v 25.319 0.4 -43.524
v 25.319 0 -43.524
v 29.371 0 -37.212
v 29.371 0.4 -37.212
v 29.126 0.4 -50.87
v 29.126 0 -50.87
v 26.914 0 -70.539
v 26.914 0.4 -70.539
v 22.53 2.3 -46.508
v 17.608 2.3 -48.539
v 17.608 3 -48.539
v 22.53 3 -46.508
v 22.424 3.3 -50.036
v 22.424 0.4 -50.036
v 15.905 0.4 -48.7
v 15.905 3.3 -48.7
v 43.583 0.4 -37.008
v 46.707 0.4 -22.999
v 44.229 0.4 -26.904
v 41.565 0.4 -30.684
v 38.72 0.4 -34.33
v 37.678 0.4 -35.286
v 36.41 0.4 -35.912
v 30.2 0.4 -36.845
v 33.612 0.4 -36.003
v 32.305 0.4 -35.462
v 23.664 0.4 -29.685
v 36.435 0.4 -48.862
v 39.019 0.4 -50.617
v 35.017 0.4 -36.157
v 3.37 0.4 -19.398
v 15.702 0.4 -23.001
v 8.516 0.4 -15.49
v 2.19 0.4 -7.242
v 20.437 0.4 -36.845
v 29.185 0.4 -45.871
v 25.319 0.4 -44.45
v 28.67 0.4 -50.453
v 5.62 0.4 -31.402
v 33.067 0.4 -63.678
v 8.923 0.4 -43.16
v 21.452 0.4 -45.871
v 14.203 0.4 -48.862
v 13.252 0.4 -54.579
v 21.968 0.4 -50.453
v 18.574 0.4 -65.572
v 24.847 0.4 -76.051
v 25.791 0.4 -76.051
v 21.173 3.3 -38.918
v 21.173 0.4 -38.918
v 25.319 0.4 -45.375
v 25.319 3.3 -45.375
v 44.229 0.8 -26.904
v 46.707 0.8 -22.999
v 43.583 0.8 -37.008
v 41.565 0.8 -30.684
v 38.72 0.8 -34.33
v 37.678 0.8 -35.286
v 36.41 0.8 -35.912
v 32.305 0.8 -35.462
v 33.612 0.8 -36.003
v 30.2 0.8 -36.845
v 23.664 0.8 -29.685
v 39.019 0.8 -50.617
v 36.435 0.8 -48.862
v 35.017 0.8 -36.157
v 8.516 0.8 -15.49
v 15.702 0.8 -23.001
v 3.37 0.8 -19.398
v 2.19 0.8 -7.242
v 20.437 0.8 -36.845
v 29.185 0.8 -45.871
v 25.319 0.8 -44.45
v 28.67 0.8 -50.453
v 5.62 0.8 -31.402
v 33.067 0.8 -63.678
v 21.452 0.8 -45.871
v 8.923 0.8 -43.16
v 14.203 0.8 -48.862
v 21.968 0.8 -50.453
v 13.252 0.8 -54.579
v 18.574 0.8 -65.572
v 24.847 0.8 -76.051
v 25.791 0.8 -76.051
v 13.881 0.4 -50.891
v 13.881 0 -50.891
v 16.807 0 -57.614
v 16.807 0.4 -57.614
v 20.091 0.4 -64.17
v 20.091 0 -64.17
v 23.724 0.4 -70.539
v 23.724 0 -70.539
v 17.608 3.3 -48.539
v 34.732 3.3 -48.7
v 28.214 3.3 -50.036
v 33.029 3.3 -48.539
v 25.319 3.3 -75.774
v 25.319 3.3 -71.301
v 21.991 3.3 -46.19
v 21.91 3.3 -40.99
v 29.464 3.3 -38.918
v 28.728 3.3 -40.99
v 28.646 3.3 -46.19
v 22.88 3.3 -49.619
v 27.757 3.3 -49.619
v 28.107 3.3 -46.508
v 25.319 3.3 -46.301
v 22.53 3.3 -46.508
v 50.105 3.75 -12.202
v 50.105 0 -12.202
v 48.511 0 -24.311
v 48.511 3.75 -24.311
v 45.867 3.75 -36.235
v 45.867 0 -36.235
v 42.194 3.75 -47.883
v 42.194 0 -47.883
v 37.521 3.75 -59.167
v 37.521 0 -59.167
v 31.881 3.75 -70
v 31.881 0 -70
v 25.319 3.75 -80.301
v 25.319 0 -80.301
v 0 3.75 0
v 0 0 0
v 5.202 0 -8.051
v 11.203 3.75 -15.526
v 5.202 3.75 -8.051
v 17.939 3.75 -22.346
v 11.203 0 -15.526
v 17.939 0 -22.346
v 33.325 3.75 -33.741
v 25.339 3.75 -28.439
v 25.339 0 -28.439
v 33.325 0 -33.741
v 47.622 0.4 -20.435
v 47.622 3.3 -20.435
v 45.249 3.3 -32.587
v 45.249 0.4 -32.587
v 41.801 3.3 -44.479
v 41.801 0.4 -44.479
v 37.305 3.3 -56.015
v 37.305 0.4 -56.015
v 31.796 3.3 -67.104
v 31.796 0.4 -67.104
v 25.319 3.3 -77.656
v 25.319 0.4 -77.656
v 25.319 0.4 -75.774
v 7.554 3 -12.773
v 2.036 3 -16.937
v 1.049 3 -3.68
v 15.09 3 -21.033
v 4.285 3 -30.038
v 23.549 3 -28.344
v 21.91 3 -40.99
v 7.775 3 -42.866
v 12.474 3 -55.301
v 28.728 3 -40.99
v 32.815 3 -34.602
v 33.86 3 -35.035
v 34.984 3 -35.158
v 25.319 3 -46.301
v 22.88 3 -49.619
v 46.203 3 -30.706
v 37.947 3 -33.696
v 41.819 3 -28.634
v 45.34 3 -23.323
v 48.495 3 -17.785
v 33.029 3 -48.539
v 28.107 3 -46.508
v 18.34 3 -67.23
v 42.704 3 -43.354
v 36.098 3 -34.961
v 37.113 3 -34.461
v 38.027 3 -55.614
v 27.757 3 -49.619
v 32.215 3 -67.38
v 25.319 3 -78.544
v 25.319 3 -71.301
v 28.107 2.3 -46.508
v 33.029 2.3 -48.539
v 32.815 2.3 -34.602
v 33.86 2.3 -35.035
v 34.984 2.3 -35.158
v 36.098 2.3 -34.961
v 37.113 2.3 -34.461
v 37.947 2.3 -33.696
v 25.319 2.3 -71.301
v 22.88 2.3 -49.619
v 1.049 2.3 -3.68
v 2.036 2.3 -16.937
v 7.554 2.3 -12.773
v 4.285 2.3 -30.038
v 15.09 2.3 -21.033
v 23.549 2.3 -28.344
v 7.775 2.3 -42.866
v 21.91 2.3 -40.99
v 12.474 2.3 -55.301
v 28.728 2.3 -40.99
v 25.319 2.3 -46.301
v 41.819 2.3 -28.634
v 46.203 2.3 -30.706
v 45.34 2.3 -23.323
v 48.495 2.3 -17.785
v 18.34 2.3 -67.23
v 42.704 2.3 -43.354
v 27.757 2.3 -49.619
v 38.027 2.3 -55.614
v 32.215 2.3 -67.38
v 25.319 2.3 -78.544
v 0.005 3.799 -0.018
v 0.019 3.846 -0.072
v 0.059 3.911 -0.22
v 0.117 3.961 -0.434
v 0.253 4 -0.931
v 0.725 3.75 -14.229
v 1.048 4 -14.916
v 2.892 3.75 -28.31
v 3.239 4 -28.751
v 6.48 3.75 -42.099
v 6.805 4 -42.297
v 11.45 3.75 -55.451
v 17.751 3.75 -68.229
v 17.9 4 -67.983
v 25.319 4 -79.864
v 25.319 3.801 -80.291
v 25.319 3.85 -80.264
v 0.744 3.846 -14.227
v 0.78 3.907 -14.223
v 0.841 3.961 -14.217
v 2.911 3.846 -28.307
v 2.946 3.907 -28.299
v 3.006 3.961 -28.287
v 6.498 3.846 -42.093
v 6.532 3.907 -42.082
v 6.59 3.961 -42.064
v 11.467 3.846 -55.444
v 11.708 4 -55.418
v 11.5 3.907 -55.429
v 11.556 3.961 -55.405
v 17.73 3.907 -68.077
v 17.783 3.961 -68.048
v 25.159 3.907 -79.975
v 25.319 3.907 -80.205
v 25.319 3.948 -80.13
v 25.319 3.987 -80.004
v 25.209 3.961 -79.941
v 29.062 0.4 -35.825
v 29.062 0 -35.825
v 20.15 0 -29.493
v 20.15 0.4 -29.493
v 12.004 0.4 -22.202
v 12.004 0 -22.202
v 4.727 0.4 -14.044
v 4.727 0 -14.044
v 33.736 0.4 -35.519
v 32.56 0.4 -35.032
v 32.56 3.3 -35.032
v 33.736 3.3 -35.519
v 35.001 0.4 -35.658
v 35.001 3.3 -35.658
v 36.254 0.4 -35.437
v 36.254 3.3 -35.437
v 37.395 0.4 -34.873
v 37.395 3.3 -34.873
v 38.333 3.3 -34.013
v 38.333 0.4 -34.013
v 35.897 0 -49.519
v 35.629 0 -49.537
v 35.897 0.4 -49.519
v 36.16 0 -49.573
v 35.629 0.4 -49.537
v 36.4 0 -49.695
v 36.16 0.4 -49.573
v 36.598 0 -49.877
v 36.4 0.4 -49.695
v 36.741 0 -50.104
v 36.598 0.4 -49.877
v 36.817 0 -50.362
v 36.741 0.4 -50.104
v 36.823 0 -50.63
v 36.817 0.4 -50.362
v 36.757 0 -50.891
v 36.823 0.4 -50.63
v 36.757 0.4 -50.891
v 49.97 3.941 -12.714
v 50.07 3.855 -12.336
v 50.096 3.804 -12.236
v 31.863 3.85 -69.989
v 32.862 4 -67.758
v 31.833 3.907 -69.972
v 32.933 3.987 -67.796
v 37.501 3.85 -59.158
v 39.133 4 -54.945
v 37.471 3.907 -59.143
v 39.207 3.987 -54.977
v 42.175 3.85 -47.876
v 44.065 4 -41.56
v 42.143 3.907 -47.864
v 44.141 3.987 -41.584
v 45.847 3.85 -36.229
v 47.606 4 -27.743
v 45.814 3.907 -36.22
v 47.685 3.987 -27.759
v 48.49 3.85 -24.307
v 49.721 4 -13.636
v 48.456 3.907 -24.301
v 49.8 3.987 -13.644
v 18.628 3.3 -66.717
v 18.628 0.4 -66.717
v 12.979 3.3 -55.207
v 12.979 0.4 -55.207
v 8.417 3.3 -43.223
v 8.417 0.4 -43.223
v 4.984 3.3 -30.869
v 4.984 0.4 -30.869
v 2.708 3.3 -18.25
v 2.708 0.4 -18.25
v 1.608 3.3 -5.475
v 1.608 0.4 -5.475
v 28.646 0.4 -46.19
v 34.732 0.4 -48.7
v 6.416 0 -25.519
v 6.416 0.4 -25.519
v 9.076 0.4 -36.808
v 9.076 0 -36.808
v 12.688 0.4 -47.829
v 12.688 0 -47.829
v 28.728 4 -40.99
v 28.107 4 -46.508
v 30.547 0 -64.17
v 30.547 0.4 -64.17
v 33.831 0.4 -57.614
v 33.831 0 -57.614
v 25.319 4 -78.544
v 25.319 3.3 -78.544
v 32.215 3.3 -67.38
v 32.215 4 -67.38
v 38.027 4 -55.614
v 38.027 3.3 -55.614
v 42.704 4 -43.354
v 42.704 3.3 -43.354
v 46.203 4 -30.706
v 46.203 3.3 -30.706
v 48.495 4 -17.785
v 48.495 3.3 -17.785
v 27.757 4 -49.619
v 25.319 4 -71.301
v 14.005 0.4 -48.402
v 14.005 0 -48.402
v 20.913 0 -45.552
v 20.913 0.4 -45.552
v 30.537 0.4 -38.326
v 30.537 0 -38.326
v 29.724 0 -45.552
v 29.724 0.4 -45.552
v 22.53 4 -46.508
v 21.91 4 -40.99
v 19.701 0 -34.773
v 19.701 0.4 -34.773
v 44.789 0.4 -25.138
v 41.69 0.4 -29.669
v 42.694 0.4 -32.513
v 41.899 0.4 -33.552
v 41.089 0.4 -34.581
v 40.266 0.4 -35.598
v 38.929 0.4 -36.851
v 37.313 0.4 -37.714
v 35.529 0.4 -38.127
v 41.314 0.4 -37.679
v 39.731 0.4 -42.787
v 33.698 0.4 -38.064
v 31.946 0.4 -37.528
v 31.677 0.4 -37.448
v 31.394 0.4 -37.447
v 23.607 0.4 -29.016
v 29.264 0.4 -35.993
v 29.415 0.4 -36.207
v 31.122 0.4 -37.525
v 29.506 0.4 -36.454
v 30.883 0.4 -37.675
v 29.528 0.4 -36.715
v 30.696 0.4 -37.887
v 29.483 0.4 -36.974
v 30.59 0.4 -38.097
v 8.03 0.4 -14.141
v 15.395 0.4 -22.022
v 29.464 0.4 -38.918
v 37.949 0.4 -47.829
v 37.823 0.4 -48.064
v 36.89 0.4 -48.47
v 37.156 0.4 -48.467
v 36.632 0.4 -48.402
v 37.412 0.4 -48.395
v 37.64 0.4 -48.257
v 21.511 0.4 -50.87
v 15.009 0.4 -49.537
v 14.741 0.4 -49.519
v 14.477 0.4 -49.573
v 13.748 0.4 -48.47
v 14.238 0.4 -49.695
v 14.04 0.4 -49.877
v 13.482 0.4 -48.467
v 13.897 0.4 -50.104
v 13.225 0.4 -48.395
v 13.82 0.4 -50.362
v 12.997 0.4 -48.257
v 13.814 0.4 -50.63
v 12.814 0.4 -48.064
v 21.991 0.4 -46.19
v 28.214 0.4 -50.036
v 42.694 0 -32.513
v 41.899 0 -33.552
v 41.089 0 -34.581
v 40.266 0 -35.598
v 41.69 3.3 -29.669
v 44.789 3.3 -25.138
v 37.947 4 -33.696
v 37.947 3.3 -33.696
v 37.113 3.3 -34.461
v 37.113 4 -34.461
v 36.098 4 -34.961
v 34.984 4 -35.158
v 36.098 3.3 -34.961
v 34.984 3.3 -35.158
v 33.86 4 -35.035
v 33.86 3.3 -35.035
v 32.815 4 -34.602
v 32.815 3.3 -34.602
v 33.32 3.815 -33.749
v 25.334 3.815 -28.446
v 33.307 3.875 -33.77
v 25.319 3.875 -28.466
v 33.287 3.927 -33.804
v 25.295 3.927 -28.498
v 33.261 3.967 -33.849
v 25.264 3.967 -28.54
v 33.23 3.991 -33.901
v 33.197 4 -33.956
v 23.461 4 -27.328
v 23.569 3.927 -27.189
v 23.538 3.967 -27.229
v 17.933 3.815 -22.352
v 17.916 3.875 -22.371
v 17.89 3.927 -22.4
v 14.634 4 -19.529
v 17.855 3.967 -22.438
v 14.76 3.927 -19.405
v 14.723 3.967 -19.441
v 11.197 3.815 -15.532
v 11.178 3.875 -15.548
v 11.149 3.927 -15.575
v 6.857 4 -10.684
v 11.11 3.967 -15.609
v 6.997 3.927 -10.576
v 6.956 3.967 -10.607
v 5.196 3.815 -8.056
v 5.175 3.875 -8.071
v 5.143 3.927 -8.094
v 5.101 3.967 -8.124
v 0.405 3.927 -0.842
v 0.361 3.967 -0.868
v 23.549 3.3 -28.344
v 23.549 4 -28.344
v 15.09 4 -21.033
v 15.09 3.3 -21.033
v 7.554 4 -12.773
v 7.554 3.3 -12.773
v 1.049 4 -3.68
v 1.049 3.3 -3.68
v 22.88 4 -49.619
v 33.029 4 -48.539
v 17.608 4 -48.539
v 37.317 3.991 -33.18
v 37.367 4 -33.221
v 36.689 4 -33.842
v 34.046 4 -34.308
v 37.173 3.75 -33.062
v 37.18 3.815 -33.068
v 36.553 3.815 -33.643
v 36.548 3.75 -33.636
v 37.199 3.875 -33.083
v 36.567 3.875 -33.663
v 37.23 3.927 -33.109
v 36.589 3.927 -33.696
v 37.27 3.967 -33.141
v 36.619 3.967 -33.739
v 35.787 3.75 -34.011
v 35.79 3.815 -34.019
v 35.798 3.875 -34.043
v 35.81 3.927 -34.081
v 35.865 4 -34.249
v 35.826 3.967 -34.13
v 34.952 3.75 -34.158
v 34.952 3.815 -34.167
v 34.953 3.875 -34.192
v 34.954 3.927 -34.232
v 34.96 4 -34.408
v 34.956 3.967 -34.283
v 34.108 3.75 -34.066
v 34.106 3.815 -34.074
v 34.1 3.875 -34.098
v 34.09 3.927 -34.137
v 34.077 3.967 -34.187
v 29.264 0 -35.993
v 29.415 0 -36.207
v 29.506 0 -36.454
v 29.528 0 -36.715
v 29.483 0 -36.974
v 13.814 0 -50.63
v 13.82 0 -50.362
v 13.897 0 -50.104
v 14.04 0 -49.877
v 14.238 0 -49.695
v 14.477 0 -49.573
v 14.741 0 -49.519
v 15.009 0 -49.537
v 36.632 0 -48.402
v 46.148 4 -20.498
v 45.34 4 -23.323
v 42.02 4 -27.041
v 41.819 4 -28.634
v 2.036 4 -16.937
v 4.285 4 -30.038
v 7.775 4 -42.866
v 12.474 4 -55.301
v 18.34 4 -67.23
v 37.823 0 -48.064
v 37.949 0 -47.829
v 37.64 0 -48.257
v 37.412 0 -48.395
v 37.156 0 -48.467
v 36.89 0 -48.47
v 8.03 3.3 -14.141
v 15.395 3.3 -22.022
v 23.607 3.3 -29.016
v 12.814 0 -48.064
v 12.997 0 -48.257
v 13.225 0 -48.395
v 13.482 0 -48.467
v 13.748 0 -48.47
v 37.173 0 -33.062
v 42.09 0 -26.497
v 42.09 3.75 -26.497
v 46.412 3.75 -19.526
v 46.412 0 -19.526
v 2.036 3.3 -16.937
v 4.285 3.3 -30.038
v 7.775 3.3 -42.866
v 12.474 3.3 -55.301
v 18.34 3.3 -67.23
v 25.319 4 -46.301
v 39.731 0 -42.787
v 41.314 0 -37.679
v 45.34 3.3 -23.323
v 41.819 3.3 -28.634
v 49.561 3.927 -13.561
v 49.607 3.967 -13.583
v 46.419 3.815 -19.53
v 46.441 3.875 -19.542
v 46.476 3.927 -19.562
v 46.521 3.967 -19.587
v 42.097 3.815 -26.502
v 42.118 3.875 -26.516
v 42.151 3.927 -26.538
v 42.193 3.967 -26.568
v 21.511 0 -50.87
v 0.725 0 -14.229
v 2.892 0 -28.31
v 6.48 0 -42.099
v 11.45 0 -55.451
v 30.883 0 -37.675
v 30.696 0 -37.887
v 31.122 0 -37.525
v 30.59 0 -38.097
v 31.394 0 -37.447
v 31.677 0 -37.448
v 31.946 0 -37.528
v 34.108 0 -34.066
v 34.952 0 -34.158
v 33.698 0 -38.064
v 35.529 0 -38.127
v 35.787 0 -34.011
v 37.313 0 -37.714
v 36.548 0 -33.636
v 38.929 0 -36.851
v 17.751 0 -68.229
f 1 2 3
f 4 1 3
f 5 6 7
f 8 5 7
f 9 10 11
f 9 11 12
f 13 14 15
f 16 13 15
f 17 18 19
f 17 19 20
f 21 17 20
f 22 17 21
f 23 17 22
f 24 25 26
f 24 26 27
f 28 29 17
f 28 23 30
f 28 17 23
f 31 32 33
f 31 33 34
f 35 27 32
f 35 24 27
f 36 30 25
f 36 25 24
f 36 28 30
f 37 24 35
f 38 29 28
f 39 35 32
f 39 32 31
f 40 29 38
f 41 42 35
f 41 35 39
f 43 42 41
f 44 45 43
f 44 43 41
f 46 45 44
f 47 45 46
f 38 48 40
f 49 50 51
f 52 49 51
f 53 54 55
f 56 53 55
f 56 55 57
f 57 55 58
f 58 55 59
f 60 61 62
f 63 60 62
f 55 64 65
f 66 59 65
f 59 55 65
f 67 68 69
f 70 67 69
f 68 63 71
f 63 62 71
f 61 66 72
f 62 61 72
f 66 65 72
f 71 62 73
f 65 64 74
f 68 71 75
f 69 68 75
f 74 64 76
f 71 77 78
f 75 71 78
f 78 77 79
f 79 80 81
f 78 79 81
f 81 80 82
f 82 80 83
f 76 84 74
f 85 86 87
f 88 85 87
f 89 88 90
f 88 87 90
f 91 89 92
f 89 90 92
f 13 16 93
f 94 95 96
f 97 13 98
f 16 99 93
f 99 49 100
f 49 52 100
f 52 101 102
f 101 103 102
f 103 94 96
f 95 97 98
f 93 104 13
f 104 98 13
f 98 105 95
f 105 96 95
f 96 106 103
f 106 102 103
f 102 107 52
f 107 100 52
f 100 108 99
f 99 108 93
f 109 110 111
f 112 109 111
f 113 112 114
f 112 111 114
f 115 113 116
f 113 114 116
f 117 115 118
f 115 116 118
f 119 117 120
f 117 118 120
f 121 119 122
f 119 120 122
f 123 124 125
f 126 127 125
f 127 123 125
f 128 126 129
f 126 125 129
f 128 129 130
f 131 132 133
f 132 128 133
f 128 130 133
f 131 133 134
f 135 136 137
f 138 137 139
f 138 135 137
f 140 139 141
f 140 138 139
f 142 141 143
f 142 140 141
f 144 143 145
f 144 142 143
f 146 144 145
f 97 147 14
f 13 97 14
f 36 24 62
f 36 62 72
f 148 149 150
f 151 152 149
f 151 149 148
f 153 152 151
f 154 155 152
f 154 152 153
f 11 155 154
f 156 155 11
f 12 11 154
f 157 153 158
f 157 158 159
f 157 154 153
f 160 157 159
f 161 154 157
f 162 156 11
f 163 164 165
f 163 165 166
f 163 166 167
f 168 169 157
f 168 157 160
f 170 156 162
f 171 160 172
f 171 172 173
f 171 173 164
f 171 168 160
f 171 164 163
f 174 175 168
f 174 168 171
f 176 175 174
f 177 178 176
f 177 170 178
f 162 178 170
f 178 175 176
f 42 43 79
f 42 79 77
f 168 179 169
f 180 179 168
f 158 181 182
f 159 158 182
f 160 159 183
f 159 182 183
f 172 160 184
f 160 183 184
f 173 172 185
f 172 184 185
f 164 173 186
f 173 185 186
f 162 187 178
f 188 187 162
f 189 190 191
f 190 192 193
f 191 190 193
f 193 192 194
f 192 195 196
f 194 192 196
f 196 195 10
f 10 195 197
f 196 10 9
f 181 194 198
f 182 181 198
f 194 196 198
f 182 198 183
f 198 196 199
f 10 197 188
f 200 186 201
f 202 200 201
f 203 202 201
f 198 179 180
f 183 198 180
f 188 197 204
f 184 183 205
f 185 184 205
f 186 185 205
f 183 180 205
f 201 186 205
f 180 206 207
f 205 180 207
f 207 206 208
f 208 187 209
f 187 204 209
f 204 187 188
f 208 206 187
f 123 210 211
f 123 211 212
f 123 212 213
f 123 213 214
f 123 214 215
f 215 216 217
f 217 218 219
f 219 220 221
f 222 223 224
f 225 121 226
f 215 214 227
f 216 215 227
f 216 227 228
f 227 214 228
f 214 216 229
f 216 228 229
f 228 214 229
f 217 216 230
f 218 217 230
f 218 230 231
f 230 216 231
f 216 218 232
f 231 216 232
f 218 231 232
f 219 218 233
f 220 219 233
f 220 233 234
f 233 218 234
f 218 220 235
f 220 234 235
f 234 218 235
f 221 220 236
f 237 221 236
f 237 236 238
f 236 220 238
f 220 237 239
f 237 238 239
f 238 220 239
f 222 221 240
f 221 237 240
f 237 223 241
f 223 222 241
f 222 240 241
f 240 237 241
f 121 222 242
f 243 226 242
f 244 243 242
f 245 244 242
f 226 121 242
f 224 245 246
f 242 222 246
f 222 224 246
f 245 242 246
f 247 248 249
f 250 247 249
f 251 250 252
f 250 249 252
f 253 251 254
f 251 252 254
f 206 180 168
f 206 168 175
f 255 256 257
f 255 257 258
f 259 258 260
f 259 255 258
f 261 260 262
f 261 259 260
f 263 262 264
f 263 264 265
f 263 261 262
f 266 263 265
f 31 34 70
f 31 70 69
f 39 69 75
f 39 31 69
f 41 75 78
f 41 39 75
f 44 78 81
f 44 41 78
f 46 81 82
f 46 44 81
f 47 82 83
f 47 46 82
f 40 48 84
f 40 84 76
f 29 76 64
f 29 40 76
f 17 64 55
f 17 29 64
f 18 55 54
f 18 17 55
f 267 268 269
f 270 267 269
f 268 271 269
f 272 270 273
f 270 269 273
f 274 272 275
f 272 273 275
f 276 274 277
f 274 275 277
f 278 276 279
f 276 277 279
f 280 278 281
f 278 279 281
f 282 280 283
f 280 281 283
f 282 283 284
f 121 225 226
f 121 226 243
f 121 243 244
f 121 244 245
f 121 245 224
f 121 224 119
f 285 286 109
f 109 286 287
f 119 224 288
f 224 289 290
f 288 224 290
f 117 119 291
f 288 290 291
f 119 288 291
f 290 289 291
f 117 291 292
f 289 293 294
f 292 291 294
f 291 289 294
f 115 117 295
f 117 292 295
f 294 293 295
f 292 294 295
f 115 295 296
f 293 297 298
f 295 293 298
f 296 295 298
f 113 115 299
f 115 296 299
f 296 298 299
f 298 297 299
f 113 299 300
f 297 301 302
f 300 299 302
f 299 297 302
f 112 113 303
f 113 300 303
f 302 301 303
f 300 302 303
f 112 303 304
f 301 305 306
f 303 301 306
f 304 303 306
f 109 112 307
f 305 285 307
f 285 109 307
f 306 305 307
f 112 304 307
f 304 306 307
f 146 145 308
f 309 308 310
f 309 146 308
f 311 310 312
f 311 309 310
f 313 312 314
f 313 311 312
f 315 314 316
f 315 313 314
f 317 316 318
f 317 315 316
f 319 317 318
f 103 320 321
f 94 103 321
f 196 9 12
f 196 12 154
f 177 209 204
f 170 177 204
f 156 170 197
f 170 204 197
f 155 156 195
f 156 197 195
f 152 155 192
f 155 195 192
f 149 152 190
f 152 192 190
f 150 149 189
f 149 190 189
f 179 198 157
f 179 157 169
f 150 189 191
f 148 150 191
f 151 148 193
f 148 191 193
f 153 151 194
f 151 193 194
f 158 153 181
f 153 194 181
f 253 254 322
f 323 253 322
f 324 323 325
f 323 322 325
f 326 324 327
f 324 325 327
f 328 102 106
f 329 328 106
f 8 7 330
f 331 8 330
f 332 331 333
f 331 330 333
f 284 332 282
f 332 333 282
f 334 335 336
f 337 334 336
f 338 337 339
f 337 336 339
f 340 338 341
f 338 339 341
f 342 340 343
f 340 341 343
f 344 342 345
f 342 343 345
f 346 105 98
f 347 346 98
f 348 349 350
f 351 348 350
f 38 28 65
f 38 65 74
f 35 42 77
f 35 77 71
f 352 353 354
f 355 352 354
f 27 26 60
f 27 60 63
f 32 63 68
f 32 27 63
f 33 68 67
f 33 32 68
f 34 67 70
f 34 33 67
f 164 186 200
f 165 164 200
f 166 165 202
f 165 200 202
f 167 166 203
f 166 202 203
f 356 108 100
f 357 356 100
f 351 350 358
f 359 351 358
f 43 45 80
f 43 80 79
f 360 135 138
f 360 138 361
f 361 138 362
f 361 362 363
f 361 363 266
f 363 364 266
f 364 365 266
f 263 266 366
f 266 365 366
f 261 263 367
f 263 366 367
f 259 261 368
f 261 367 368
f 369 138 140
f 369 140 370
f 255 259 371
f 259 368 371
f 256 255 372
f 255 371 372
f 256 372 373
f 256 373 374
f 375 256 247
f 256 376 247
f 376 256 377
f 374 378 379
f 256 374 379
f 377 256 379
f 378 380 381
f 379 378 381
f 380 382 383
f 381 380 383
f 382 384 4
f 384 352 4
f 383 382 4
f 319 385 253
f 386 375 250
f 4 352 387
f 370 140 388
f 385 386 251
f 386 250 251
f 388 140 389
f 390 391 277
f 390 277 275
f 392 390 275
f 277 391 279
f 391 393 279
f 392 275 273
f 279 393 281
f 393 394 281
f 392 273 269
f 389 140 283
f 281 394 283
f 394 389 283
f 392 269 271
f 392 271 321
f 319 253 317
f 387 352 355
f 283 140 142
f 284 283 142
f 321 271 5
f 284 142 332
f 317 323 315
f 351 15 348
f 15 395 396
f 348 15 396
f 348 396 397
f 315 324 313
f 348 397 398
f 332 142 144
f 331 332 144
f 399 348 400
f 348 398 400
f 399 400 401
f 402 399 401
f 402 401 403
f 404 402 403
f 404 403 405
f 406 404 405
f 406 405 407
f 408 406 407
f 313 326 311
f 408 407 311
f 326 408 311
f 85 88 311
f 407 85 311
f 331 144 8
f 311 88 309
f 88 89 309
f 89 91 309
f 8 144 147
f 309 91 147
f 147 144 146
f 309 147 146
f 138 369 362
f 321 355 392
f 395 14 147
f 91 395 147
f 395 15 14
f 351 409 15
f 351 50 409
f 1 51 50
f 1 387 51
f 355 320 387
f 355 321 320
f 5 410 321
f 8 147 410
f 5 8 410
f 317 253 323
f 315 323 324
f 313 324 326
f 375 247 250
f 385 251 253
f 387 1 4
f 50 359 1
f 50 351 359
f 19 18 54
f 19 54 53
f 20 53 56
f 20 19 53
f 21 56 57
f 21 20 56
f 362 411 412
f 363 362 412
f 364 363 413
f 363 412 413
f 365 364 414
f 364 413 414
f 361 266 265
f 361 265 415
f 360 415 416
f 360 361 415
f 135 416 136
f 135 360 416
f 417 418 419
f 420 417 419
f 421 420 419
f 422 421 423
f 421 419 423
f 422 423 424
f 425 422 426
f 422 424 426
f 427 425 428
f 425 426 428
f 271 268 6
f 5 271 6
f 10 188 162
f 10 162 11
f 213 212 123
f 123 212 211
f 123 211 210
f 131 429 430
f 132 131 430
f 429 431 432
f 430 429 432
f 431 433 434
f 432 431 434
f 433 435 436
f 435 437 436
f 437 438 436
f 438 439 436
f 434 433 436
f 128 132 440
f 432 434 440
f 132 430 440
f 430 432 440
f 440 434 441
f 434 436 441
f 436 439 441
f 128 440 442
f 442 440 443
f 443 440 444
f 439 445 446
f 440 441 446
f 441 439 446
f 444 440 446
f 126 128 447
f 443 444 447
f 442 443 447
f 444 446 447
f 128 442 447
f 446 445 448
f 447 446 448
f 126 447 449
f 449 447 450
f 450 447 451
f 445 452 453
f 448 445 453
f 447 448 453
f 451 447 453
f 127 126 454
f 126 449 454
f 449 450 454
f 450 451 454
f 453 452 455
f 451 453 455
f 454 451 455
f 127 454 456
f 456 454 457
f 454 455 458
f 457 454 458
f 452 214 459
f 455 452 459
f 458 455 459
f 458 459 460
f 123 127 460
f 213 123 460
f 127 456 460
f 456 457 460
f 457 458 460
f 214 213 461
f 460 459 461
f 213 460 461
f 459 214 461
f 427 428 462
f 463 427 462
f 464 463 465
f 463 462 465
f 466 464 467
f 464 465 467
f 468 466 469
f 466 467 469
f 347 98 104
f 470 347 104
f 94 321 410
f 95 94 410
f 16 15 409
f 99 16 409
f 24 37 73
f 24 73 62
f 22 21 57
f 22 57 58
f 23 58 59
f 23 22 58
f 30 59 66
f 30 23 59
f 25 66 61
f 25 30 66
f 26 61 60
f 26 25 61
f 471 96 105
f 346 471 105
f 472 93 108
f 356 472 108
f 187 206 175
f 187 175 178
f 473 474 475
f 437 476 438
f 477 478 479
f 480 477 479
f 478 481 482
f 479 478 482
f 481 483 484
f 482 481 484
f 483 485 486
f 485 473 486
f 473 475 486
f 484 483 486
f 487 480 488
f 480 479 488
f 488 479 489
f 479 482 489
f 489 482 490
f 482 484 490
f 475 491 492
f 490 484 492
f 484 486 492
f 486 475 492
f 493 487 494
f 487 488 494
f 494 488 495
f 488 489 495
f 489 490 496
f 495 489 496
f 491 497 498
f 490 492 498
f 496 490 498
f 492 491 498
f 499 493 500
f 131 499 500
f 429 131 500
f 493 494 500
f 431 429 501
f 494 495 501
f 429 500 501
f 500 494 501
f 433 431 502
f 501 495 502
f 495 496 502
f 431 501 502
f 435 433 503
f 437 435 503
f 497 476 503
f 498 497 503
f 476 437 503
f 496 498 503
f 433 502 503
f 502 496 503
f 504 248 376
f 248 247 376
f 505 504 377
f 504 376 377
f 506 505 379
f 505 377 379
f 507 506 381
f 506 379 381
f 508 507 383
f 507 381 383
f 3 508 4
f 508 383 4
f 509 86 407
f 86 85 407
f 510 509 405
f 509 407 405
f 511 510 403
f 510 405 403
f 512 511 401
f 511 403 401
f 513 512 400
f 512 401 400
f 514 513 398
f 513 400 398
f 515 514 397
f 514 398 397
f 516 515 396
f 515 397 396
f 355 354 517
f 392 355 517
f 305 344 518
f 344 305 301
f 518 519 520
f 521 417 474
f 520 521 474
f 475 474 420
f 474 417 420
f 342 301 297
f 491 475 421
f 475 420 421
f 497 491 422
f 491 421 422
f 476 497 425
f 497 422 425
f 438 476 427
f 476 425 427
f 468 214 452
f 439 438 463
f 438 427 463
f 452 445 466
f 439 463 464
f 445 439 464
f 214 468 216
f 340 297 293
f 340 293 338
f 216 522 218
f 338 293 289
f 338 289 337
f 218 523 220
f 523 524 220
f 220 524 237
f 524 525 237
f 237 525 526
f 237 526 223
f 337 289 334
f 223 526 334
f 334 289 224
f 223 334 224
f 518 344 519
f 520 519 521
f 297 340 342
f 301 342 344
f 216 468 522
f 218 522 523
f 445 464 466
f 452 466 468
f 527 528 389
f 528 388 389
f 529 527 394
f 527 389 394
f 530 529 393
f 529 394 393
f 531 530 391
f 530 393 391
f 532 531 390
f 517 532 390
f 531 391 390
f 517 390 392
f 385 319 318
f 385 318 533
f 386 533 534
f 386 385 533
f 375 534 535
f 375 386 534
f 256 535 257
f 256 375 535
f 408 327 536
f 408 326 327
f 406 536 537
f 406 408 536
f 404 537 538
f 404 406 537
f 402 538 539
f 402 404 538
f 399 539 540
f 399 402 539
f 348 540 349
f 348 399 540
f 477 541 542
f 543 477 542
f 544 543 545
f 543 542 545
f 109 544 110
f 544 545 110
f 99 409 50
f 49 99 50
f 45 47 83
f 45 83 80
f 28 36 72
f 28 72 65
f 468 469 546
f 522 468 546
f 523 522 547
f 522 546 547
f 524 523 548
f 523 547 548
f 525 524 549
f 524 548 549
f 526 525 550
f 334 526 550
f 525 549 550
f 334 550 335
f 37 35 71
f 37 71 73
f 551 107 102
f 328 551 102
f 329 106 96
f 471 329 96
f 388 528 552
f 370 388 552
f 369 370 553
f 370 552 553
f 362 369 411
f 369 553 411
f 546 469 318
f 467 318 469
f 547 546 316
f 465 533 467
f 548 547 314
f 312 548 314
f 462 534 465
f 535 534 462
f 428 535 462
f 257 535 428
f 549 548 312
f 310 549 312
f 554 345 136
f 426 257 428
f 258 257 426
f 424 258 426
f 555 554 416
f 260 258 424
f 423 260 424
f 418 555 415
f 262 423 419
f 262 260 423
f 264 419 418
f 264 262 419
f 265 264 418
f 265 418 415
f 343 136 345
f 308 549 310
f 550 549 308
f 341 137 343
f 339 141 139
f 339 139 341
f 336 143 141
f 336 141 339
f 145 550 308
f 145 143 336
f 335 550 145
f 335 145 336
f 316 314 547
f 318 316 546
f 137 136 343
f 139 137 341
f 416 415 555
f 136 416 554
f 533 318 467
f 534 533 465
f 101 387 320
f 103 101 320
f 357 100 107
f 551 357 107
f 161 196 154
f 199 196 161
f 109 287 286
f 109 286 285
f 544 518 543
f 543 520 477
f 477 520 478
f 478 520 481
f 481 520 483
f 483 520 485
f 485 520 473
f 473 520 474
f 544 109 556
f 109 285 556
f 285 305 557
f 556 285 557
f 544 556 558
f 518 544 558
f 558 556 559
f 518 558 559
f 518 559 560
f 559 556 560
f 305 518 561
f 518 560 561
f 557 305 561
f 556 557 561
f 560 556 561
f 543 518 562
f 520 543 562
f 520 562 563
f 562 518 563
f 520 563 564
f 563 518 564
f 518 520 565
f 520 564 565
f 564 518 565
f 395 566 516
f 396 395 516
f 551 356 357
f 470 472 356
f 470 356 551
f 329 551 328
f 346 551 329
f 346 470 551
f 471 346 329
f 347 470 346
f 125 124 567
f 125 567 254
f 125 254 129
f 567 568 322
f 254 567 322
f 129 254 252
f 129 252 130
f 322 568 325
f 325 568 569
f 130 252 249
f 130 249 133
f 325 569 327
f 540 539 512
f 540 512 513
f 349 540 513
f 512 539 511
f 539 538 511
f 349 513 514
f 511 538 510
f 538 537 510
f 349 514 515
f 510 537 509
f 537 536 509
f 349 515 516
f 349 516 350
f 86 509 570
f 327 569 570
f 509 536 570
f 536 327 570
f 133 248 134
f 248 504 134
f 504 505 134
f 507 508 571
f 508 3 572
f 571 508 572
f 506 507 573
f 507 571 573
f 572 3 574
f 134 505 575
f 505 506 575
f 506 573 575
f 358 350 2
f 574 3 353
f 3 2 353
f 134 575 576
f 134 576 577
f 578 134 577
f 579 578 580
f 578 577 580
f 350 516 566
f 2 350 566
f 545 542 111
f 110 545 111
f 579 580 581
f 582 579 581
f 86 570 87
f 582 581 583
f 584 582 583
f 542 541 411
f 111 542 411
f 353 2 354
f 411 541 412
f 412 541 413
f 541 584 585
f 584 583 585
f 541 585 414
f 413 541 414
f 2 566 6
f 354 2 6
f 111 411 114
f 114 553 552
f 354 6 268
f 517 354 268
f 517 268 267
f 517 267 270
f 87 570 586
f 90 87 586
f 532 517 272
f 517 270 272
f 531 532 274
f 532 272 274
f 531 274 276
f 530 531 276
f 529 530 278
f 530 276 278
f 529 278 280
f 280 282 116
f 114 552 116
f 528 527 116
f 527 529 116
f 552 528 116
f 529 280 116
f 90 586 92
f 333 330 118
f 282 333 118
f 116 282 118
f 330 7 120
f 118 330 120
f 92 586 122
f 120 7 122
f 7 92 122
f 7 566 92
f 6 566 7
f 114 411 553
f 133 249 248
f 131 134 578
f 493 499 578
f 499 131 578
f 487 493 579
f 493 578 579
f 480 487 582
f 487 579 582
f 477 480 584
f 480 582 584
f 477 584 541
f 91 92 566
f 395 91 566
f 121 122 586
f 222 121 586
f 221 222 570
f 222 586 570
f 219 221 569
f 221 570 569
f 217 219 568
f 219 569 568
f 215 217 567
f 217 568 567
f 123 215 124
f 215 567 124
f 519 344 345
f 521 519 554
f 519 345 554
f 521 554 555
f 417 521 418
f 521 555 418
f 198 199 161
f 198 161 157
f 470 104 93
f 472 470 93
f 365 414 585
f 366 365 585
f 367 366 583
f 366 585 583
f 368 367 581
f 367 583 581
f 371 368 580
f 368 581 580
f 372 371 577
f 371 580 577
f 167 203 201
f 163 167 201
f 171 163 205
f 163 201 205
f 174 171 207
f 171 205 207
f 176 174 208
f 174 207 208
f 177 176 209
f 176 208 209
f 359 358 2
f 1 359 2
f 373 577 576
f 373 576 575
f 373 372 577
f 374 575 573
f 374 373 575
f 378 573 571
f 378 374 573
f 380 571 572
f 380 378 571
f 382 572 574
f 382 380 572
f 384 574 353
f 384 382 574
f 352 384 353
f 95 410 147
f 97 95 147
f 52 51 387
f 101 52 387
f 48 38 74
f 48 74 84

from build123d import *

# Parameters (mm, degrees)
BOSS_EXTRUDE4_START  = 2.3
BOSS_EXTRUDE4_DEPTH  = 0.7
BOSS_EXTRUDE5_DEPTH  = 3.3
BOSS_EXTRUDE6_DEPTH  = 3.3
BOSS_EXTRUDE7_DEPTH  = 4
BOSS_EXTRUDE8_DEPTH  = 4
BOSS_EXTRUDE11_DEPTH = 0.4
FILLET1_R            = 1
BOSS_EXTRUDE13_DEPTH = 0.4
FILLET2_R            = 0.25


with BuildPart() as part:
    # Sketch7 → Boss-Extrude4 (new body)
    with BuildSketch(Plane(origin=(0, 0, 0), x_dir=(1, 0, 0), z_dir=(0, 1, 0)).offset(BOSS_EXTRUDE4_START)):
        with BuildLine():
            ThreePointArc((25.3187138, 78.544271563), (7.774655726, 42.865584467), (1.048717339, 3.67981614))
            ThreePointArc((1.048717339, 3.67981614), (15.089584113, 21.033250642), (32.814888894, 34.601640347))
            ThreePointArc((32.814888894, 34.601640347), (35.548345535, 35.099201296), (37.946501588, 33.696275907))
            ThreePointArc((37.946501588, 33.696275907), (43.624222728, 26.008293603), (48.494904785, 17.785274356))
            ThreePointArc((48.494904785, 17.785274356), (40.509944663, 49.539169466), (25.3187138, 78.544271563))
        make_face()
        Polygon((25.3187138, 71.300701089), (22.880167391, 49.619221751), (17.607947401, 48.538636703), (22.53025342, 46.508084516), (21.9096513, 40.990218623), (25.3187138, 46.300701089), (28.7277763, 40.990218623), (28.107174179, 46.508084516), (33.029480199, 48.538636703), (27.757260208, 49.619221751), align=None, mode=Mode.SUBTRACT)
    extrude(amount=BOSS_EXTRUDE4_DEPTH)


with BuildPart() as body_2:
    # Sketch11 → Boss-Extrude5 (new body)
    with BuildSketch(Plane(origin=(0, 0, 0), x_dir=(1, 0, 0), z_dir=(0, 1, 0))):
        Polygon((25.3187138, 75.774305051), (22.423901789, 50.036100284), (15.905432755, 48.700086198), (21.991275042, 46.189551437), (21.173408654, 38.917779558), (25.3187138, 45.375147323), (29.464018945, 38.917779558), (28.646152557, 46.189551437), (34.731994844, 48.700086198), (28.21352581, 50.036100284), align=None)
    extrude(amount=BOSS_EXTRUDE5_DEPTH)

    # Sketch4 → Boss-Extrude8 (add)
    with BuildSketch(Plane(origin=(0, 0, 0), x_dir=(1, 0, 0), z_dir=(0, 1, 0))):
        Polygon((25.3187138, 71.300701089), (22.880167391, 49.619221751), (17.607947401, 48.538636703), (22.53025342, 46.508084516), (21.9096513, 40.990218623), (25.3187138, 46.300701089), (28.7277763, 40.990218623), (28.107174179, 46.508084516), (33.029480199, 48.538636703), (27.757260208, 49.619221751), align=None)
    extrude(amount=BOSS_EXTRUDE8_DEPTH)



with BuildPart() as body_3:
    # Sketch8 → Boss-Extrude6 (new body)
    with BuildSketch(Plane(origin=(0, 0, 0), x_dir=(1, 0, 0), z_dir=(0, 1, 0))):
        with BuildLine():
            ThreePointArc((25.3187138, 80.300701089), (6.479626895, 42.098811931), (0, 0))
            ThreePointArc((0, 0), (14.483479935, 19.022484189), (33.324507598, 33.741239989))
            ThreePointArc((33.324507598, 33.741239989), (35.374600079, 34.114410701), (37.173217119, 33.062216659))
            ThreePointArc((37.173217119, 33.062216659), (44.32763613, 23.058929343), (50.104685332, 12.201803985))
            ThreePointArc((50.104685332, 12.201803985), (42.194394509, 47.882820066), (25.3187138, 80.300701089))
        make_face()
        with BuildLine():
            ThreePointArc((25.3187138, 77.655988793), (8.417285199, 43.223132296), (1.60825988, 5.475058578))
            ThreePointArc((1.60825988, 5.475058578), (15.395050063, 22.022293224), (32.560079542, 35.031840527))
            ThreePointArc((32.560079542, 35.031840527), (35.635218263, 35.591596594), (38.333143822, 34.01330553))
            ThreePointArc((38.333143822, 34.01330553), (43.27239761, 27.425793547), (47.621637666, 20.434681115))
            ThreePointArc((47.621637666, 20.434681115), (39.681799875, 50.297117055), (25.3187138, 77.655988793))
        make_face(mode=Mode.SUBTRACT)
    extrude(amount=BOSS_EXTRUDE6_DEPTH)

    # Sketch5 → Boss-Extrude7 (add)
    with BuildSketch(Plane(origin=(0, 0, 0), x_dir=(1, 0, 0), z_dir=(0, 1, 0))):
        with BuildLine():
            ThreePointArc((33.324507598, 33.741239989), (14.483479935, 19.022484189), (0, 0))
            ThreePointArc((0, 0), (6.479626895, 42.098811931), (25.3187138, 80.300701089))
            ThreePointArc((25.3187138, 80.300701089), (42.194394509, 47.882820066), (50.104685332, 12.201803985))
            ThreePointArc((50.104685332, 12.201803985), (44.32763613, 23.058929343), (37.173217119, 33.062216659))
            ThreePointArc((37.173217119, 33.062216659), (35.374600079, 34.114410701), (33.324507598, 33.741239989))
        make_face()
        with BuildLine():
            ThreePointArc((48.494904785, 17.785274356), (43.624222728, 26.008293603), (37.946501588, 33.696275907))
            ThreePointArc((37.946501588, 33.696275907), (35.548345535, 35.099201296), (32.814888894, 34.601640347))
            ThreePointArc((32.814888894, 34.601640347), (15.089584113, 21.033250642), (1.048717339, 3.67981614))
            ThreePointArc((1.048717339, 3.67981614), (7.774655726, 42.865584467), (25.3187138, 78.544271563))
            ThreePointArc((25.3187138, 78.544271563), (40.509944663, 49.539169466), (48.494904785, 17.785274356))
        make_face(mode=Mode.SUBTRACT)
    extrude(amount=BOSS_EXTRUDE7_DEPTH)


with BuildPart() as body_2_1:
    add(body_2.part)

    add(body_3.part)  # Boss-Extrude11 merges body 3
    # Sketch14 → Boss-Extrude11 (add)
    with BuildSketch(Plane(origin=(0, 0, 0), x_dir=(1, 0, 0), z_dir=(0, 1, 0))):
        with BuildLine():
            ThreePointArc((33.324507598, 33.741239989), (14.483479935, 19.022484189), (0, 0))
            ThreePointArc((0, 0), (6.479626895, 42.098811931), (25.3187138, 80.300701089))
            ThreePointArc((25.3187138, 80.300701089), (42.194394509, 47.882820066), (50.104685332, 12.201803985))
            ThreePointArc((50.104685332, 12.201803985), (44.32763613, 23.058929343), (37.173217119, 33.062216659))
            ThreePointArc((37.173217119, 33.062216659), (35.374600079, 34.114410701), (33.324507598, 33.741239989))
        make_face()
        with BuildLine():
            Line((23.723630878, 70.539393135), (21.511370585, 50.869857351))
            Line((21.511370585, 50.869857351), (13.198167733, 49.16599774))
            ThreePointArc((13.198167733, 49.16599774), (17.991973603, 60.083620852), (23.723630878, 70.539393135))
        make_face(mode=Mode.SUBTRACT)
        with BuildLine():
            Line((13.054684669, 48.794332823), (20.913318286, 45.552485279))
            Line((20.913318286, 45.552485279), (19.700923362, 34.77290143))
            Line((19.700923362, 34.77290143), (25.3187138, 43.52403979))
            Line((25.3187138, 43.52403979), (29.919000612, 36.357922285))
            ThreePointArc((29.919000612, 36.357922285), (16.351293772, 26.297844628), (4.727035456, 14.043684112))
            ThreePointArc((4.727035456, 14.043684112), (7.744533302, 31.693714336), (13.054684669, 48.794332823))
        make_face(mode=Mode.SUBTRACT)
        with BuildLine():
            Line((30.704502872, 36.835660121), (29.724109313, 45.552485279))
            Line((29.724109313, 45.552485279), (37.58274293, 48.794332823))
            ThreePointArc((37.58274293, 48.794332823), (40.393915943, 40.733938341), (42.693859526, 32.513055637))
            ThreePointArc((42.693859526, 32.513055637), (41.495664758, 34.067994846), (40.266354995, 35.59845365))
            ThreePointArc((40.266354995, 35.59845365), (36.069581902, 38.053573082), (31.286032781, 37.182841422))
            ThreePointArc((31.286032781, 37.182841422), (30.994965848, 37.009756586), (30.704502872, 36.835660121))
        make_face(mode=Mode.SUBTRACT)
        with BuildLine():
            Line((37.439259866, 49.16599774), (29.126057014, 50.869857351))
            Line((29.126057014, 50.869857351), (26.913796721, 70.539393135))
            ThreePointArc((26.913796721, 70.539393135), (32.645453996, 60.083620852), (37.439259866, 49.16599774))
        make_face(mode=Mode.SUBTRACT)
    extrude(amount=BOSS_EXTRUDE11_DEPTH)

    # Fillet1
    fillet1_edges = [body_2_1.edges().sort_by_distance(p)[0] for p in [
        (29.919000612, 0.2, -36.357922285),
        (30.704502872, 0.2, -36.835660121),
        (37.439259866, 0.2, -49.16599774),
        (37.58274293, 0.2, -48.794332823),
        (13.054684669, 0.2, -48.794332823),
        (13.198167733, 0.2, -49.16599774),
    ]]
    fillet(fillet1_edges, radius=FILLET1_R)

    # Fillet2
    fillet2_edges = [body_2_1.edges().sort_by_distance(p)[0] for p in [
        (35.374600079, 4, -34.114410701),
        (44.32763613, 4, -23.058929343),
        (42.194394509, 4, -47.882820066),
        (6.479626895, 4, -42.098811931),
        (14.483479935, 4, -19.022484189),
    ]]
    fillet(fillet2_edges, radius=FILLET2_R)


with BuildPart() as body_3_2:
    # Sketch19 → Boss-Extrude13 (new body)
    with BuildSketch(Plane(origin=(0, 0.4, 0), x_dir=(1, 0, 0), z_dir=(0, 1, 0))):
        with BuildLine():
            Line((24.8466447, 76.050672339), (21.967636187, 50.452978818))
            Line((21.967636187, 50.452978818), (14.20291811, 48.861535693))
            Line((14.20291811, 48.861535693), (21.452296664, 45.871018358))
            Line((21.452296664, 45.871018358), (20.437166008, 36.845340494))
            Line((20.437166008, 36.845340494), (25.3187138, 44.449593557))
            Line((25.3187138, 44.449593557), (30.200261591, 36.845340494))
            Line((30.200261591, 36.845340494), (29.185130935, 45.871018358))
            Line((29.185130935, 45.871018358), (36.434509489, 48.861535693))
            Line((36.434509489, 48.861535693), (28.669791412, 50.452978818))
            Line((28.669791412, 50.452978818), (25.790782899, 76.050672339))
            ThreePointArc((25.790782899, 76.050672339), (39.0193522, 50.617007376), (46.707447601, 22.998905551))
            ThreePointArc((46.707447601, 22.998905551), (42.919872721, 28.810012622), (38.719786057, 34.330335154))
            ThreePointArc((38.719786057, 34.330335154), (35.722090991, 36.083991891), (32.30527019, 35.462040706))
            ThreePointArc((32.30527019, 35.462040706), (15.702286424, 23.001186092), (2.190151091, 7.241929563))
            ThreePointArc((2.190151091, 7.241929563), (8.92270814, 43.159512956), (24.8466447, 76.050672339))
        make_face()
    extrude(amount=BOSS_EXTRUDE13_DEPTH)


solid = Compound([part.part, body_2_1.part, body_3_2.part])
